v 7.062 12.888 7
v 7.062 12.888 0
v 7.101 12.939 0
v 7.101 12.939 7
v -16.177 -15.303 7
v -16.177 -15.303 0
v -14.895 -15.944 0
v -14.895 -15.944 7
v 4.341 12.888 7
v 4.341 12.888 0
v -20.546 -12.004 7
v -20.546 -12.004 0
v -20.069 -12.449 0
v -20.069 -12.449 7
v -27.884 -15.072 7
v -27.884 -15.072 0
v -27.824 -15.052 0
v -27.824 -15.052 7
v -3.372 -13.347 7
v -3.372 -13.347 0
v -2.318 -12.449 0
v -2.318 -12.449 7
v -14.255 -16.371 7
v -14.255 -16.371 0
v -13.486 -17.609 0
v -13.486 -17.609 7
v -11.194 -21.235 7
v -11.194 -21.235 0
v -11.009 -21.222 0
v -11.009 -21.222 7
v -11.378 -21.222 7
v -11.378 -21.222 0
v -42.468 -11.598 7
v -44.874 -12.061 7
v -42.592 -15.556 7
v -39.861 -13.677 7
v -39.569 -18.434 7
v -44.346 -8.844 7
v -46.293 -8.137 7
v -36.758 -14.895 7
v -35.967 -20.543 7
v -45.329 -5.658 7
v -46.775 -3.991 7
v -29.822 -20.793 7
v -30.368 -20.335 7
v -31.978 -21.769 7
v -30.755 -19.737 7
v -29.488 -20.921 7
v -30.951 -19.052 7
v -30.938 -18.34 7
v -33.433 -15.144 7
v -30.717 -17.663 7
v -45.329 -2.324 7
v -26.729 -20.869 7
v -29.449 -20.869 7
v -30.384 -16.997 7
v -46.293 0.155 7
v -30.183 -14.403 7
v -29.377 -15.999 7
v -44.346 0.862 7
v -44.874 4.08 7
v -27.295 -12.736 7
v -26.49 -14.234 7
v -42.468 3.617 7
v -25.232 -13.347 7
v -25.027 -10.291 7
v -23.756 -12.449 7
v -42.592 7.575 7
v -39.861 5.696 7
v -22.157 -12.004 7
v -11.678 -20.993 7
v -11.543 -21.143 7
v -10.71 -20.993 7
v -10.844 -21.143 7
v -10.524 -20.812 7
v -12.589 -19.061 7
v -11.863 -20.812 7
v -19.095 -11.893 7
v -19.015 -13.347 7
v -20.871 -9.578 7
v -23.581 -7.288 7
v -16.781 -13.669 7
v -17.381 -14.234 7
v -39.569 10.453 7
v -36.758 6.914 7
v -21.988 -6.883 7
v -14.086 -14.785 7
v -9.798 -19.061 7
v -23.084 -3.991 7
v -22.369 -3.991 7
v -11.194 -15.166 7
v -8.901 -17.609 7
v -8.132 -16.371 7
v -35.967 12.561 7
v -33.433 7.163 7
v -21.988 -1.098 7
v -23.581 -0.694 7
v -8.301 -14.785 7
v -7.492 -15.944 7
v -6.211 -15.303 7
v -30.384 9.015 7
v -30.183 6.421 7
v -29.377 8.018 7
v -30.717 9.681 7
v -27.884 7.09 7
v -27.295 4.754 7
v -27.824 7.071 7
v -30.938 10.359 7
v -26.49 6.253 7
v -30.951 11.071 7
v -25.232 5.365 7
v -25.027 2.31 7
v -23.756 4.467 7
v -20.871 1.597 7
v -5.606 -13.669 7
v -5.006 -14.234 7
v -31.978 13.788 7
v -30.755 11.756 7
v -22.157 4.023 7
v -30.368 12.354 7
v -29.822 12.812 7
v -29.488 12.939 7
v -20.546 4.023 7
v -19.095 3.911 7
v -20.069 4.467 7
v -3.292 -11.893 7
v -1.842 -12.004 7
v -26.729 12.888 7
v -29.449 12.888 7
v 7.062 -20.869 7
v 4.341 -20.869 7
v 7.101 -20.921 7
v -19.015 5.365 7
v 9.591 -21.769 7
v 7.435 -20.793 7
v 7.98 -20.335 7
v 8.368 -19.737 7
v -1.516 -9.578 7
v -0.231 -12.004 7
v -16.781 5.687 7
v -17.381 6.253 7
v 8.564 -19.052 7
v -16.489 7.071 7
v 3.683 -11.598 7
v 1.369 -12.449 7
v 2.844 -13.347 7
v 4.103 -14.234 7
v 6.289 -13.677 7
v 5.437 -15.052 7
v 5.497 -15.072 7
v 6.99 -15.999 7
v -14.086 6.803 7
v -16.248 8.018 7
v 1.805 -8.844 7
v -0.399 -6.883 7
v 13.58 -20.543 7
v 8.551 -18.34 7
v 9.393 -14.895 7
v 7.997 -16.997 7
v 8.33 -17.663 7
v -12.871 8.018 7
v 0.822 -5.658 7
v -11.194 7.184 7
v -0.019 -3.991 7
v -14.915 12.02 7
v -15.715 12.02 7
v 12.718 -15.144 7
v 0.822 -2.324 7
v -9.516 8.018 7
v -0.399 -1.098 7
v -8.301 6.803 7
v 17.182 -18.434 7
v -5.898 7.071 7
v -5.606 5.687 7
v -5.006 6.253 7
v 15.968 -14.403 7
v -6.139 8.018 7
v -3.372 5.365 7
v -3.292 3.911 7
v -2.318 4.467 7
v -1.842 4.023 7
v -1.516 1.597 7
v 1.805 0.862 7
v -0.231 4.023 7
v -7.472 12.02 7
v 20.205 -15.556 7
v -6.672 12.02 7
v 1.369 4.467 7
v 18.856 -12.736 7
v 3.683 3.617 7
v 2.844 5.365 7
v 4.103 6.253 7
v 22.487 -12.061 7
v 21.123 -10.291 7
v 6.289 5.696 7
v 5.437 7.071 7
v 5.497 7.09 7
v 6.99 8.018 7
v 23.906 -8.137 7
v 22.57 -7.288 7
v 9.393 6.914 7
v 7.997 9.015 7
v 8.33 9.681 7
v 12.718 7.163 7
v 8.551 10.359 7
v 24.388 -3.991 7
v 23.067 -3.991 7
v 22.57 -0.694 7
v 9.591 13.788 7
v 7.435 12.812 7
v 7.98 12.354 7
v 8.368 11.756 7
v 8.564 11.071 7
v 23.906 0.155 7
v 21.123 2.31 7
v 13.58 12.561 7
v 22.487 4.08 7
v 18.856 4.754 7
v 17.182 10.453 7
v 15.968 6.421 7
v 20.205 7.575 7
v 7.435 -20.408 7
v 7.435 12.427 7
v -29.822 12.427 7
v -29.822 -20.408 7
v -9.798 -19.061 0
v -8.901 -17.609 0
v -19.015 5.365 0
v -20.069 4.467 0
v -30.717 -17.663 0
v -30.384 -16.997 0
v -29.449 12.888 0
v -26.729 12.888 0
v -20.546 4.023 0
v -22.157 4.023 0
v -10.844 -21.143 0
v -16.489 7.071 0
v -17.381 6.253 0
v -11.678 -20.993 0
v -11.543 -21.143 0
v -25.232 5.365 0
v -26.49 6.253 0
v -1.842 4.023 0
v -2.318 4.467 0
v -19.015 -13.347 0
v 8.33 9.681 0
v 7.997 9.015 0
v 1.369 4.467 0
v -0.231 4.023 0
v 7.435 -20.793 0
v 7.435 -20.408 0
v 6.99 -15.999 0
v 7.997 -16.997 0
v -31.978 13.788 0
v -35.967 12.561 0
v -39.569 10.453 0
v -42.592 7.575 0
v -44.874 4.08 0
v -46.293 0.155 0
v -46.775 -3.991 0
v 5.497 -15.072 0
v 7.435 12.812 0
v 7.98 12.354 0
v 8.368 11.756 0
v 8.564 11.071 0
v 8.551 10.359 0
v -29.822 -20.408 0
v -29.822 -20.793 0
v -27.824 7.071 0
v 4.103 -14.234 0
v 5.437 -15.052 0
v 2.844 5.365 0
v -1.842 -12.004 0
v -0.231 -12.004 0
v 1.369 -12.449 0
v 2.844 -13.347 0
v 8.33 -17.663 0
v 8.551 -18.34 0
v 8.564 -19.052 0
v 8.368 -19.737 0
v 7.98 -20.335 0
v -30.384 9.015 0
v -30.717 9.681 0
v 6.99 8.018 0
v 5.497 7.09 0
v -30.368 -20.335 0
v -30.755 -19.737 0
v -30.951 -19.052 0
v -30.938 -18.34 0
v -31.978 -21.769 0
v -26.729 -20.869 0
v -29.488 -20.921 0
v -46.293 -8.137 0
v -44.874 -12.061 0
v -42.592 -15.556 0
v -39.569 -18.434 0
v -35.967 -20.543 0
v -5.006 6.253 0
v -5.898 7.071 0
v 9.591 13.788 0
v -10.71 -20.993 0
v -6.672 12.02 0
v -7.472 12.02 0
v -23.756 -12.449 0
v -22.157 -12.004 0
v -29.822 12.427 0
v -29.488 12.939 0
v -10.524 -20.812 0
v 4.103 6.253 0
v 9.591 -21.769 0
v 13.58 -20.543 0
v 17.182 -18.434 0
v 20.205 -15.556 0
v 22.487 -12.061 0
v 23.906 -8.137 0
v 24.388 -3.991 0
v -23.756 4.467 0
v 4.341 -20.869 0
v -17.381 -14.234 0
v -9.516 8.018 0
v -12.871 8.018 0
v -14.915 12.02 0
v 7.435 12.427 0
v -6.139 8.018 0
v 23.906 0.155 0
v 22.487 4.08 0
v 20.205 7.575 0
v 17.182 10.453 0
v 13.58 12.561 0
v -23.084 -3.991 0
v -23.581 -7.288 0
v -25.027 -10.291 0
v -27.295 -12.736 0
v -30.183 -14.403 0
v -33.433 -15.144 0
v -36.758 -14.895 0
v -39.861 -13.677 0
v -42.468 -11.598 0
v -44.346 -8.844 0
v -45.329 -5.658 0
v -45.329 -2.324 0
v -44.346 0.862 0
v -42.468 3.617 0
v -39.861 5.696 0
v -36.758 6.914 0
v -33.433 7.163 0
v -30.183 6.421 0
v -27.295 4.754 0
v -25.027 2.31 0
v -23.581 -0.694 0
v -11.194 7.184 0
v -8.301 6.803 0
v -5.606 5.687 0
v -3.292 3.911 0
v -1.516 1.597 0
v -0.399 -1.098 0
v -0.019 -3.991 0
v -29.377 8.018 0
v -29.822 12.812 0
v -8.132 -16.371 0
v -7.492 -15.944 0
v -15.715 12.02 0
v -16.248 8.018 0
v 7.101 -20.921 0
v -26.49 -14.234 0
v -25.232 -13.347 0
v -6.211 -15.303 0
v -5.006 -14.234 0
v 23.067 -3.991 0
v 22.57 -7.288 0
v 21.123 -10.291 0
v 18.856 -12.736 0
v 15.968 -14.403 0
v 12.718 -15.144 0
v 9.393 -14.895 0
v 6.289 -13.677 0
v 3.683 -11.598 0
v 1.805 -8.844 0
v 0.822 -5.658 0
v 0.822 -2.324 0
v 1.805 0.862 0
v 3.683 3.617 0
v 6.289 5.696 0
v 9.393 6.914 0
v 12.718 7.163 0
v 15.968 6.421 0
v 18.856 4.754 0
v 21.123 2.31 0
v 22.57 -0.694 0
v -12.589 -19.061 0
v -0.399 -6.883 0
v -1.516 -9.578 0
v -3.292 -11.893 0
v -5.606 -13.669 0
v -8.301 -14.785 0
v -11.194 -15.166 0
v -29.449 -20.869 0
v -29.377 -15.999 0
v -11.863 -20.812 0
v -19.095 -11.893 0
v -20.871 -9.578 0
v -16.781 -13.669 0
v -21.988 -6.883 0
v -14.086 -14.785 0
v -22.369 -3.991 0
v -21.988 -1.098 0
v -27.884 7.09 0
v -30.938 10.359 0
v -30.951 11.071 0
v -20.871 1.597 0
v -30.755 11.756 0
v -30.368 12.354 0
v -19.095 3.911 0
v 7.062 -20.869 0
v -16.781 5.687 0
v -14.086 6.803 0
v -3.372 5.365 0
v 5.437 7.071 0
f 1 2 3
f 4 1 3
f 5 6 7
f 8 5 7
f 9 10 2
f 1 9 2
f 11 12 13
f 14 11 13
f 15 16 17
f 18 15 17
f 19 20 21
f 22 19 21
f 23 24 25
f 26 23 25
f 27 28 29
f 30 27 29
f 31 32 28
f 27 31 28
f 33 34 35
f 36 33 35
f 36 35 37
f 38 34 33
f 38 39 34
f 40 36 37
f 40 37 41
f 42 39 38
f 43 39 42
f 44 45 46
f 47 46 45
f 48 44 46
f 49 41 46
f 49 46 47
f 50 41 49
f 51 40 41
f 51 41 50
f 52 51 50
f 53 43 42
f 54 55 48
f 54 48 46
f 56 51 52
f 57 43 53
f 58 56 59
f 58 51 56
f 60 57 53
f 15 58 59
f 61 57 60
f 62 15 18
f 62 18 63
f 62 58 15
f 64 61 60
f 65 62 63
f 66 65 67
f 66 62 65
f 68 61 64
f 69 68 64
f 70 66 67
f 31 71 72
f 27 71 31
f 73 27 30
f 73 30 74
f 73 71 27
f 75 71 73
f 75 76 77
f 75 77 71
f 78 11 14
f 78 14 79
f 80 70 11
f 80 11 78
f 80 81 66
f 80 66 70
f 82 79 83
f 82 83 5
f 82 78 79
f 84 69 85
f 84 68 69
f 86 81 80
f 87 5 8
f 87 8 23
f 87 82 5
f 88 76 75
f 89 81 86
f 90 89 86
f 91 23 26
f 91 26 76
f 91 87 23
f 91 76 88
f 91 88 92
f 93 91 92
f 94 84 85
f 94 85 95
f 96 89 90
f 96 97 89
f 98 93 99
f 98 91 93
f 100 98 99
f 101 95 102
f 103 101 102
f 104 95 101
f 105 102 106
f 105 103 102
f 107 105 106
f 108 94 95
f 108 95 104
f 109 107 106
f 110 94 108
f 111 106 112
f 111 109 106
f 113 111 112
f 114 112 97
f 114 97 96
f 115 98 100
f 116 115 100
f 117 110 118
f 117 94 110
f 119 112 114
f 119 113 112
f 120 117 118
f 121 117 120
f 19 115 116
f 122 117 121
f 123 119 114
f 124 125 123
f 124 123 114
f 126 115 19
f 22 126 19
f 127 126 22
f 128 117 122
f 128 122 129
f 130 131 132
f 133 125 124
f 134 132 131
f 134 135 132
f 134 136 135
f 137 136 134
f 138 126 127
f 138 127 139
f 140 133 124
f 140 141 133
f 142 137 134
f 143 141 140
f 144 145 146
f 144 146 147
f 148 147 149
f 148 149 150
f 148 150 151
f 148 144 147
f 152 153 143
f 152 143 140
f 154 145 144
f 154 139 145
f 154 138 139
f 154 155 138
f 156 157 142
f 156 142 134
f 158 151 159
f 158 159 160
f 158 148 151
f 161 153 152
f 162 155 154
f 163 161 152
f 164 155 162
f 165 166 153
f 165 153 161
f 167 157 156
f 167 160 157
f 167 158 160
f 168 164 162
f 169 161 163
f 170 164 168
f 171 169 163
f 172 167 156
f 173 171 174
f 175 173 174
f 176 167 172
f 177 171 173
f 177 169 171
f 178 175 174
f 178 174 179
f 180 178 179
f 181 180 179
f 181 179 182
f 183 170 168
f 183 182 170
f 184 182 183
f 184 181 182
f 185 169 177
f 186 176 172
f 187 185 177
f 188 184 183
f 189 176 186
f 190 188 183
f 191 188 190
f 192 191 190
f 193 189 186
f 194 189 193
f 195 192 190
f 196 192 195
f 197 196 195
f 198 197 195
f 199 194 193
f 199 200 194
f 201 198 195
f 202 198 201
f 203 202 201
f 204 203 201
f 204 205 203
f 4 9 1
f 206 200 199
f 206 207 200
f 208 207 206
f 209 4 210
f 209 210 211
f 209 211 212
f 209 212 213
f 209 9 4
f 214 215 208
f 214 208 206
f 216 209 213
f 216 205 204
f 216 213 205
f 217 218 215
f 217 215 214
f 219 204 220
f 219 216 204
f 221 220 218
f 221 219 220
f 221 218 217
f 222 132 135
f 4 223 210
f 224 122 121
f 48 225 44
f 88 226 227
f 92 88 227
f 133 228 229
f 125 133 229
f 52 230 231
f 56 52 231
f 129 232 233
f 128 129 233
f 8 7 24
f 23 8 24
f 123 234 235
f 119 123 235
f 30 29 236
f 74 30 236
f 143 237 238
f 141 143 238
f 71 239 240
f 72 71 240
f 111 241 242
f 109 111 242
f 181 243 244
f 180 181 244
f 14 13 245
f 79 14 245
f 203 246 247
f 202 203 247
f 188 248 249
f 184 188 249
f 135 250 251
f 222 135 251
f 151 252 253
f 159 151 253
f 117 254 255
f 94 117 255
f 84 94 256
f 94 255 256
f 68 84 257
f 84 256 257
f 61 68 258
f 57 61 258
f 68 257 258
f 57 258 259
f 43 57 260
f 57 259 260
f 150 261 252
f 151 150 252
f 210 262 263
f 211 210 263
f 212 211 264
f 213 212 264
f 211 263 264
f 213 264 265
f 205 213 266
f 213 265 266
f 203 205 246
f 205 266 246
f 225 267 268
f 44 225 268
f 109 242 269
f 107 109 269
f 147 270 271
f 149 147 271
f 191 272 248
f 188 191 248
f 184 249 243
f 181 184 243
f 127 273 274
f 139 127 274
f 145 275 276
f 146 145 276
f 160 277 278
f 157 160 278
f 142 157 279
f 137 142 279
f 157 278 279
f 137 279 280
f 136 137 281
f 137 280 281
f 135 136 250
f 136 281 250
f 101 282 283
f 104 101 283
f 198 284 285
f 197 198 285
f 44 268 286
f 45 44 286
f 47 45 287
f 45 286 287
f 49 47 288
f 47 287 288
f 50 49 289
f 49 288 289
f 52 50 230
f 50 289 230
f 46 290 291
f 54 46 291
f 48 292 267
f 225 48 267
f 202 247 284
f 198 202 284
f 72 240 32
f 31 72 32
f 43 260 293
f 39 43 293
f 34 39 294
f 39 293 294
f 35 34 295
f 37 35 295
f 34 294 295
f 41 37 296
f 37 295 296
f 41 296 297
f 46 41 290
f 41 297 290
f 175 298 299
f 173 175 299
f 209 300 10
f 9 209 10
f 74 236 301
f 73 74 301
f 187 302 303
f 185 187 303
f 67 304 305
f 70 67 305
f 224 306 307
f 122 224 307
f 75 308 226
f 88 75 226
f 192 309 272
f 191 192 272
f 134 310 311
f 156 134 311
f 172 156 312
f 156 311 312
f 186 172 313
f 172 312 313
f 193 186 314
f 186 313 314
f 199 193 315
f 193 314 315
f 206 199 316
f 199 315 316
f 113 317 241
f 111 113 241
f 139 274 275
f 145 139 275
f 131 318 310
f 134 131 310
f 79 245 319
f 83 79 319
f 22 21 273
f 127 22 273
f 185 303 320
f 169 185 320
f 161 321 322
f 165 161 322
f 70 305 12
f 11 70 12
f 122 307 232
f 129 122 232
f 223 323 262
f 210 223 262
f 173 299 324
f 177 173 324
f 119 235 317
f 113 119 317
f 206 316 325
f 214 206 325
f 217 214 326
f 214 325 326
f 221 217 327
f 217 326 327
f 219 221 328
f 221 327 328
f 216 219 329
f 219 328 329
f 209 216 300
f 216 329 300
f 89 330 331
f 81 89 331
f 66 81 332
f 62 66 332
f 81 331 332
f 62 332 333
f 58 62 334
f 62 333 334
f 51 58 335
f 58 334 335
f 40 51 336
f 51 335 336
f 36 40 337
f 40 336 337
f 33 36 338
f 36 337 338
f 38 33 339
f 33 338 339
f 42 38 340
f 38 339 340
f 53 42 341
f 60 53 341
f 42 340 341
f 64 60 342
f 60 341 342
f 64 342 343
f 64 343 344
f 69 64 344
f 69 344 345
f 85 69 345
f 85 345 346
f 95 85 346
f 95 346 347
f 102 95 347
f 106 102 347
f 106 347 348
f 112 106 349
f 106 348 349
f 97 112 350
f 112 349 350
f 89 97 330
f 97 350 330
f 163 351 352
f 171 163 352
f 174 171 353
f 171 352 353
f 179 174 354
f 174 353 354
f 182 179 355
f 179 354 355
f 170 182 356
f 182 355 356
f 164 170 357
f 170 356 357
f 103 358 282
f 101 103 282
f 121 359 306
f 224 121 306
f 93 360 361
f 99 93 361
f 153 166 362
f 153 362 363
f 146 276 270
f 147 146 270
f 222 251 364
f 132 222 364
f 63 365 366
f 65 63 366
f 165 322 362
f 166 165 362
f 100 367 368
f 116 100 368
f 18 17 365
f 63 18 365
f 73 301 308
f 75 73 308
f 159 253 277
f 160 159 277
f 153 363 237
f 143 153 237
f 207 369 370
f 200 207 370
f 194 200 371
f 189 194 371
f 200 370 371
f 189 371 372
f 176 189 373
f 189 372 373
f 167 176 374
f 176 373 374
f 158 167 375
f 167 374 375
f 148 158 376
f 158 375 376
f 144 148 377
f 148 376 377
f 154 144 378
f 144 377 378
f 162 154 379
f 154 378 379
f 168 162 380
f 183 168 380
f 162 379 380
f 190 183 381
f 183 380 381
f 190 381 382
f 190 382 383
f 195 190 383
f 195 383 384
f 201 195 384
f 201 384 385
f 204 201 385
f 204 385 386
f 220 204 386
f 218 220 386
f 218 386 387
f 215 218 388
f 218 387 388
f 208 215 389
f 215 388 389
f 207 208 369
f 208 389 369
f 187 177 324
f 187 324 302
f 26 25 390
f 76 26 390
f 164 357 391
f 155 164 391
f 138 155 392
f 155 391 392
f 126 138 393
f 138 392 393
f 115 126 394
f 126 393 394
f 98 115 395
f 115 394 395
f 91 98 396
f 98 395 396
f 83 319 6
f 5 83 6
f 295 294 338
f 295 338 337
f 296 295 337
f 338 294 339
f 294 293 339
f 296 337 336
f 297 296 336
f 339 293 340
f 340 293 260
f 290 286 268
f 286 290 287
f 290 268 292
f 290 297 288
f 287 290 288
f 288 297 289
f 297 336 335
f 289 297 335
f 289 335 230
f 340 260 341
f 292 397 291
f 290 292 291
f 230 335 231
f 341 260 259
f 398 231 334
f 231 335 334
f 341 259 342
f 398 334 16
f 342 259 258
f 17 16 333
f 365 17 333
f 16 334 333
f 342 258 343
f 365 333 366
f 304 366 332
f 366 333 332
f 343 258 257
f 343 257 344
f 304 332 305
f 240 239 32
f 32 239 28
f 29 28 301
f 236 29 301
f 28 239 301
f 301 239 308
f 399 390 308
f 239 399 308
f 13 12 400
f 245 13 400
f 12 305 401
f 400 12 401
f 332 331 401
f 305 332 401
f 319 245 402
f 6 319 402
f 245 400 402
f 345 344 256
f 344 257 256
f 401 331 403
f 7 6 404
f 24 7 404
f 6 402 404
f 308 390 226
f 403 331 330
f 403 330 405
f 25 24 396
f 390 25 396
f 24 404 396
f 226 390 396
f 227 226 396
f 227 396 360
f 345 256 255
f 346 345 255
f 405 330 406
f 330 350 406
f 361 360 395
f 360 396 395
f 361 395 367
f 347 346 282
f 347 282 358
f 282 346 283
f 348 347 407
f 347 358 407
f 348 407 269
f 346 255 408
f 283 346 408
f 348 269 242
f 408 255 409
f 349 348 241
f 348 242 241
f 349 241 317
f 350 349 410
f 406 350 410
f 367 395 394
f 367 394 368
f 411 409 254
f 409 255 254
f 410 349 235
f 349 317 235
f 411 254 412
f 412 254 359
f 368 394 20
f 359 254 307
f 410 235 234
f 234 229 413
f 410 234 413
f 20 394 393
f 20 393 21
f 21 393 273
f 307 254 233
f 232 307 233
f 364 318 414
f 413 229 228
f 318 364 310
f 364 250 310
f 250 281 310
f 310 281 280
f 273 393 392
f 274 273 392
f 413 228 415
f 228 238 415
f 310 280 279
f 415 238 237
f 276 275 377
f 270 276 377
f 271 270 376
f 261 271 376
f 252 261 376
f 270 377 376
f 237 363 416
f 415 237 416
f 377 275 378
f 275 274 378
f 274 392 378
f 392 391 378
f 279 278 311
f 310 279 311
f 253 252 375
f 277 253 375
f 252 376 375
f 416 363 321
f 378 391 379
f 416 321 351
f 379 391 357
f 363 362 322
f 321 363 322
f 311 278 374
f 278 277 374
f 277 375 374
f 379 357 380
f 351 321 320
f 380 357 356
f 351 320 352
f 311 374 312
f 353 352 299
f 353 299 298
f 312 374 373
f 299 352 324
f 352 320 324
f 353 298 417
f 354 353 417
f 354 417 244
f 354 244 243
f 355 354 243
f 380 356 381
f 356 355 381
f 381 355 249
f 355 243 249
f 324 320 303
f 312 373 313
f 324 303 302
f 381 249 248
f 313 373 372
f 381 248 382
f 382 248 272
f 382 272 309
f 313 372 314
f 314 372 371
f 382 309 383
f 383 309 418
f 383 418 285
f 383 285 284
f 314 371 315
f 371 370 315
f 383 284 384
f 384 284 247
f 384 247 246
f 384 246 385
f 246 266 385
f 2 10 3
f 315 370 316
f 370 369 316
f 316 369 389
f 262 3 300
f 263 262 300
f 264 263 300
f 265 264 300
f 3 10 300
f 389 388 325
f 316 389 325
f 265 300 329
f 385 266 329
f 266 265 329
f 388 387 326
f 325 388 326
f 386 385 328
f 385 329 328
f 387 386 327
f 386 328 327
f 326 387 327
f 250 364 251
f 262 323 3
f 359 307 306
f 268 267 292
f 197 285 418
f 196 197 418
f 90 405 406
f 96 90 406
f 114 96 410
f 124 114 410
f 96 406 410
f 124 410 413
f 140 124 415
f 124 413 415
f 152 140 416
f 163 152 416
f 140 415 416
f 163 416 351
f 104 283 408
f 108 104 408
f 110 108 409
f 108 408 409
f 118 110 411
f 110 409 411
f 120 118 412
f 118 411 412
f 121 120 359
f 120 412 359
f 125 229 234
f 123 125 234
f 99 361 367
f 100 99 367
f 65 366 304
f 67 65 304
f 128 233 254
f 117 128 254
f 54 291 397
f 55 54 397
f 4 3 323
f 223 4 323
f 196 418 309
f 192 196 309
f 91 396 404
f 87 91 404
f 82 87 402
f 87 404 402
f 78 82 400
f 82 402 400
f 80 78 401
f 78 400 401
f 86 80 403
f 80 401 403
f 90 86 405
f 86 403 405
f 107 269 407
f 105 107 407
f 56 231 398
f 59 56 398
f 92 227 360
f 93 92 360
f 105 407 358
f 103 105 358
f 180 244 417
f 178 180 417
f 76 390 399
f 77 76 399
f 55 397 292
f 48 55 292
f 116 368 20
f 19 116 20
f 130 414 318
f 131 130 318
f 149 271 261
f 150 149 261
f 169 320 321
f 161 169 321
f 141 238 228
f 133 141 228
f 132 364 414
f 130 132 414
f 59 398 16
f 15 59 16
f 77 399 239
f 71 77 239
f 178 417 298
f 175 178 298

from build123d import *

# Parameters (mm, degrees)
F1_DEPTH = 7


with BuildPart() as f1:
    # F0 (on Top) → F1 (new body)
    with BuildSketch(Plane.XY):
        with BuildLine():
            Line((-9.5156790438, 8.0177858472), (-11.1935704821, 8.0177858472))
            Line((-11.1935704821, 8.0177858472), (-11.1935704821, 7.1842455149))
            ThreePointArc((-11.1935704821, 7.1842455149), (-3.2916522024, 3.9111637946), (-0.0185704821, -3.9907544851))
            Line((-0.0185704821, -3.9907544851), (0.6968380189, -3.9907544851))
            ThreePointArc((0.6968380189, -3.9907544851), (11.8818380189, 7.1942455149), (23.0668380189, -3.9907544851))
            Line((23.0668380189, -3.9907544851), (24.3879653764, -3.9907544851))
            ThreePointArc((24.3879653764, -3.9907544851), (20.2046001278, 7.574637803), (9.5905543801, 13.7875981641))
            Line((9.5905543801, 13.7875981641), (4.3414574909, 12.8877644123))
            Line((4.3414574909, 12.8877644123), (7.0621605543, 12.8877644123))
            Line((7.0621605543, 12.8877644123), (7.1005078763, 12.9391789266))
            Line((7.1005078763, 12.9391789266), (7.0621605543, 12.9979698101))
            ThreePointArc((7.0621605543, 12.9979698101), (7.0936847528, 12.9852326851), (7.1250260168, 12.9720518424))
            Line((7.1250260168, 12.9720518424), (7.434807209, 13.3873937414))
            Line((7.434807209, 13.3873937414), (7.434807209, 12.8117063385))
            ThreePointArc((7.434807209, 12.8117063385), (8.491424386, 11.4206477043), (8.3299577236, 9.68127641))
            Line((8.3299577236, 9.68127641), (7.9968838744, 9.0151312817))
            Line((7.9968838744, 9.0151312817), (6.9897325292, 8.0177858472))
            Line((6.9897325292, 8.0177858472), (5.4971418776, 7.0902415154))
            Line((5.4971418776, 7.0902415154), (5.4365344596, 7.0707021364))
            Line((5.4365344596, 7.0707021364), (4.1030183685, 6.2526246615))
            Line((4.1030183685, 6.2526246615), (2.8443824751, 5.3654393264))
            Line((2.8443824751, 5.3654393264), (1.3687987131, 4.4671497308))
            Line((1.3687987131, 4.4671497308), (-0.2305540937, 4.0228855796))
            Line((-0.2305540937, 4.0228855796), (-1.8416251987, 4.0228855796))
            Line((-1.8416251987, 4.0228855796), (-2.3177509651, 4.4671497308))
            Line((-2.3177509651, 4.4671497308), (-3.372264767, 5.3654393264))
            Line((-3.372264767, 5.3654393264), (-5.0061216356, 6.2526246615))
            Line((-5.0061216356, 6.2526246615), (-5.8977964759, 7.0707021364))
            Line((-5.8977964759, 7.0707021364), (-6.1392687011, 8.0177858472))
            Line((-6.1392687011, 8.0177858472), (-6.6723875451, 12.0196435601))
            Line((-6.6723875451, 12.0196435601), (-7.4720630172, 12.0196435601))
            Line((-7.4720630172, 12.0196435601), (-9.5156790438, 8.0177858472))
        make_face()
        with BuildLine():
            Line((-11.1935704821, 7.1842455149), (-11.1935704821, 8.0177858472))
            Line((-11.1935704821, 8.0177858472), (-12.8714619204, 8.0177858472))
            Line((-12.8714619204, 8.0177858472), (-14.9150779471, 12.0196435601))
            Line((-14.9150779471, 12.0196435601), (-15.7147534192, 12.0196435601))
            Line((-15.7147534192, 12.0196435601), (-16.2478722632, 8.0177858472))
            Line((-16.2478722632, 8.0177858472), (-16.4893444883, 7.0707021364))
            Line((-16.4893444883, 7.0707021364), (-17.3810193286, 6.2526246615))
            Line((-17.3810193286, 6.2526246615), (-19.0148761972, 5.3654393264))
            Line((-19.0148761972, 5.3654393264), (-20.0693899991, 4.4671497308))
            Line((-20.0693899991, 4.4671497308), (-20.5455157655, 4.0228855796))
            Line((-20.5455157655, 4.0228855796), (-22.1565868706, 4.0228855796))
            Line((-22.1565868706, 4.0228855796), (-23.7559396774, 4.4671497308))
            Line((-23.7559396774, 4.4671497308), (-25.2315234393, 5.3654393264))
            Line((-25.2315234393, 5.3654393264), (-26.4901593328, 6.2526246615))
            Line((-26.4901593328, 6.2526246615), (-27.8236754239, 7.0707021364))
            Line((-27.8236754239, 7.0707021364), (-27.8842828419, 7.0902415154))
            Line((-27.8842828419, 7.0902415154), (-29.3768734935, 8.0177858472))
            Line((-29.3768734935, 8.0177858472), (-30.3840248386, 9.0151312817))
            Line((-30.3840248386, 9.0151312817), (-30.7170986879, 9.68127641))
            ThreePointArc((-30.7170986879, 9.68127641), (-30.8785653503, 11.4206477043), (-29.8219481732, 12.8117063385))
            Line((-29.8219481732, 12.8117063385), (-29.8219481732, 13.3873937414))
            Line((-29.8219481732, 13.3873937414), (-29.5121669811, 12.9720518424))
            ThreePointArc((-29.5121669811, 12.9720518424), (-29.4808257171, 12.9852326851), (-29.4493015186, 12.9979698101))
            Line((-29.4493015186, 12.9979698101), (-29.4876488406, 12.9391789266))
            Line((-29.4876488406, 12.9391789266), (-29.4493015186, 12.8877644123))
            Line((-29.4493015186, 12.8877644123), (-26.7285984551, 12.8877644123))
            Line((-26.7285984551, 12.8877644123), (-31.9776953444, 13.7875981641))
            ThreePointArc((-31.9776953444, 13.7875981641), (-42.591741092, 7.574637803), (-46.7751063406, -3.9907544851))
            Line((-46.7751063406, -3.9907544851), (-45.4539789832, -3.9907544851))
            ThreePointArc((-45.4539789832, -3.9907544851), (-34.2689789832, 7.1942455149), (-23.0839789832, -3.9907544851))
            Line((-23.0839789832, -3.9907544851), (-22.3685704821, -3.9907544851))
            ThreePointArc((-22.3685704821, -3.9907544851), (-19.0954887619, 3.9111637946), (-11.1935704821, 7.1842455149))
        make_face()
        with BuildLine():
            Line((0.6968380189, -3.9907544851), (-0.0185704821, -3.9907544851))
            ThreePointArc((-0.0185704821, -3.9907544851), (-3.2916522024, -11.8926727649), (-11.1935704821, -15.1657544851))
            Line((-11.1935704821, -15.1657544851), (-11.1935704821, -20.9864545614))
            Line((-11.1935704821, -20.9864545614), (-11.1935704821, -21.2352294797))
            Line((-11.1935704821, -21.2352294797), (-11.0093258071, -21.2222263217))
            Line((-11.0093258071, -21.2222263217), (-10.8436854306, -21.1433488876))
            Line((-10.8436854306, -21.1433488876), (-10.7095954689, -20.9934841841))
            Line((-10.7095954689, -20.9934841841), (-10.5240434158, -20.8122693002))
            Line((-10.5240434158, -20.8122693002), (-9.7980234521, -19.0612804145))
            Line((-9.7980234521, -19.0612804145), (-8.9011756453, -17.6092404872))
            Line((-8.9011756453, -17.6092404872), (-8.1324489537, -16.3707379252))
            Line((-8.1324489537, -16.3707379252), (-7.4918433773, -15.9436669201))
            Line((-7.4918433773, -15.9436669201), (-6.2106322247, -15.3030613437))
            Line((-6.2106322247, -15.3030613437), (-5.0061216356, -14.2341336318))
            Line((-5.0061216356, -14.2341336318), (-3.372264767, -13.3469482966))
            Line((-3.372264767, -13.3469482966), (-2.3177509651, -12.448658701))
            Line((-2.3177509651, -12.448658701), (-1.8416251987, -12.0043945499))
            Line((-1.8416251987, -12.0043945499), (-0.2305540937, -12.0043945499))
            Line((-0.2305540937, -12.0043945499), (1.3687987131, -12.448658701))
            Line((1.3687987131, -12.448658701), (2.8443824751, -13.3469482966))
            Line((2.8443824751, -13.3469482966), (4.1030183685, -14.2341336318))
            Line((4.1030183685, -14.2341336318), (5.4365344596, -15.0522111066))
            Line((5.4365344596, -15.0522111066), (5.4971418776, -15.0717504856))
            Line((5.4971418776, -15.0717504856), (6.9897325292, -15.9992948174))
            Line((6.9897325292, -15.9992948174), (7.9968838744, -16.996640252))
            Line((7.9968838744, -16.996640252), (8.3299577236, -17.6627853803))
            ThreePointArc((8.3299577236, -17.6627853803), (8.491424386, -19.4021566746), (7.434807209, -20.7932153088))
            Line((7.434807209, -20.7932153088), (7.434807209, -21.3689027117))
            Line((7.434807209, -21.3689027117), (7.1250260168, -20.9535608126))
            ThreePointArc((7.1250260168, -20.9535608126), (7.0936847528, -20.9667416554), (7.0621605543, -20.9794787804))
            Line((7.0621605543, -20.9794787804), (7.1005078763, -20.9206878969))
            Line((7.1005078763, -20.9206878969), (7.0621605543, -20.8692733825))
            Line((7.0621605543, -20.8692733825), (4.3414574909, -20.8692733825))
            Line((4.3414574909, -20.8692733825), (9.5905543801, -21.7691071344))
            ThreePointArc((9.5905543801, -21.7691071344), (20.2046001278, -15.5561467733), (24.3879653764, -3.9907544851))
            Line((24.3879653764, -3.9907544851), (23.0668380189, -3.9907544851))
            ThreePointArc((23.0668380189, -3.9907544851), (11.8818380189, -15.1757544851), (0.6968380189, -3.9907544851))
        make_face()
        with BuildLine():
            ThreePointArc((-11.1935704821, -15.1657544851), (-19.0954887619, -11.8926727649), (-22.3685704821, -3.9907544851))
            Line((-22.3685704821, -3.9907544851), (-23.0839789832, -3.9907544851))
            ThreePointArc((-23.0839789832, -3.9907544851), (-34.2689789832, -15.1757544851), (-45.4539789832, -3.9907544851))
            Line((-45.4539789832, -3.9907544851), (-46.7751063406, -3.9907544851))
            ThreePointArc((-46.7751063406, -3.9907544851), (-42.591741092, -15.5561467733), (-31.9776953444, -21.7691071344))
            Line((-31.9776953444, -21.7691071344), (-26.7285984551, -20.8692733825))
            Line((-26.7285984551, -20.8692733825), (-29.4493015186, -20.8692733825))
            Line((-29.4493015186, -20.8692733825), (-29.4876488406, -20.9206878969))
            Line((-29.4876488406, -20.9206878969), (-29.4493015186, -20.9794787804))
            ThreePointArc((-29.4493015186, -20.9794787804), (-29.4808257171, -20.9667416554), (-29.5121669811, -20.9535608126))
            Line((-29.5121669811, -20.9535608126), (-29.8219481732, -21.3689027117))
            Line((-29.8219481732, -21.3689027117), (-29.8219481732, -20.7932153088))
            ThreePointArc((-29.8219481732, -20.7932153088), (-30.8785653503, -19.4021566746), (-30.7170986879, -17.6627853803))
            Line((-30.7170986879, -17.6627853803), (-30.3840248386, -16.996640252))
            Line((-30.3840248386, -16.996640252), (-29.3768734935, -15.9992948174))
            Line((-29.3768734935, -15.9992948174), (-27.8842828419, -15.0717504856))
            Line((-27.8842828419, -15.0717504856), (-27.8236754239, -15.0522111066))
            Line((-27.8236754239, -15.0522111066), (-26.4901593328, -14.2341336318))
            Line((-26.4901593328, -14.2341336318), (-25.2315234393, -13.3469482966))
            Line((-25.2315234393, -13.3469482966), (-23.7559396774, -12.448658701))
            Line((-23.7559396774, -12.448658701), (-22.1565868706, -12.0043945499))
            Line((-22.1565868706, -12.0043945499), (-20.5455157655, -12.0043945499))
            Line((-20.5455157655, -12.0043945499), (-20.0693899991, -12.448658701))
            Line((-20.0693899991, -12.448658701), (-19.0148761972, -13.3469482966))
            Line((-19.0148761972, -13.3469482966), (-17.3810193286, -14.2341336318))
            Line((-17.3810193286, -14.2341336318), (-16.1765087396, -15.3030613437))
            Line((-16.1765087396, -15.3030613437), (-14.8952975869, -15.9436669201))
            Line((-14.8952975869, -15.9436669201), (-14.2546920106, -16.3707379252))
            Line((-14.2546920106, -16.3707379252), (-13.485965319, -17.6092404872))
            Line((-13.485965319, -17.6092404872), (-12.5891175121, -19.0612804145))
            Line((-12.5891175121, -19.0612804145), (-11.8630975485, -20.8122693002))
            Line((-11.8630975485, -20.8122693002), (-11.6775454953, -20.9934841841))
            Line((-11.6775454953, -20.9934841841), (-11.5434555337, -21.1433488876))
            Line((-11.5434555337, -21.1433488876), (-11.3778151572, -21.2222263217))
            Line((-11.3778151572, -21.2222263217), (-11.1935704821, -21.2352294797))
            Line((-11.1935704821, -21.2352294797), (-11.1935704821, -20.9864545614))
            Line((-11.1935704821, -20.9864545614), (-11.1935704821, -15.1657544851))
        make_face()
        with BuildLine():
            Line((7.0621605543, 12.9979698101), (7.1005078763, 12.9391789266))
            Line((7.1005078763, 12.9391789266), (7.1250260168, 12.9720518424))
            ThreePointArc((7.1250260168, 12.9720518424), (7.0936847528, 12.9852326851), (7.0621605543, 12.9979698101))
        make_face()
        with BuildLine():
            Line((7.1250260168, 12.9720518424), (7.1005078763, 12.9391789266))
            Line((7.1005078763, 12.9391789266), (7.434807209, 12.4266593527))
            Line((7.434807209, 12.4266593527), (7.434807209, 12.8117063385))
            ThreePointArc((7.434807209, 12.8117063385), (7.2828231187, 12.897494345), (7.1250260168, 12.9720518424))
        make_face()
        with BuildLine():
            Line((7.434807209, -20.4081683229), (7.1005078763, -20.9206878969))
            Line((7.1005078763, -20.9206878969), (7.1250260168, -20.9535608126))
            ThreePointArc((7.1250260168, -20.9535608126), (7.2828231187, -20.8790033153), (7.434807209, -20.7932153088))
            Line((7.434807209, -20.7932153088), (7.434807209, -20.4081683229))
        make_face()
        with BuildLine():
            Line((7.1250260168, -20.9535608126), (7.1005078763, -20.9206878969))
            Line((7.1005078763, -20.9206878969), (7.0621605543, -20.9794787804))
            ThreePointArc((7.0621605543, -20.9794787804), (7.0936847528, -20.9667416554), (7.1250260168, -20.9535608126))
        make_face()
        with BuildLine():
            Line((-29.5121669811, 12.9720518424), (-29.4876488406, 12.9391789266))
            Line((-29.4876488406, 12.9391789266), (-29.4493015186, 12.9979698101))
            ThreePointArc((-29.4493015186, 12.9979698101), (-29.4808257171, 12.9852326851), (-29.5121669811, 12.9720518424))
        make_face()
        with BuildLine():
            Line((-29.8219481732, 12.4266593527), (-29.4876488406, 12.9391789266))
            Line((-29.4876488406, 12.9391789266), (-29.5121669811, 12.9720518424))
            ThreePointArc((-29.5121669811, 12.9720518424), (-29.6699640829, 12.897494345), (-29.8219481732, 12.8117063385))
            Line((-29.8219481732, 12.8117063385), (-29.8219481732, 12.4266593527))
        make_face()
        with BuildLine():
            Line((-29.4493015186, -20.9794787804), (-29.4876488406, -20.9206878969))
            Line((-29.4876488406, -20.9206878969), (-29.5121669811, -20.9535608126))
            ThreePointArc((-29.5121669811, -20.9535608126), (-29.4808257171, -20.9667416554), (-29.4493015186, -20.9794787804))
        make_face()
        with BuildLine():
            Line((-29.5121669811, -20.9535608126), (-29.4876488406, -20.9206878969))
            Line((-29.4876488406, -20.9206878969), (-29.8219481732, -20.4081683229))
            Line((-29.8219481732, -20.4081683229), (-29.8219481732, -20.7932153088))
            ThreePointArc((-29.8219481732, -20.7932153088), (-29.6699640829, -20.8790033153), (-29.5121669811, -20.9535608126))
        make_face()
        with BuildLine():
            Line((7.434807209, 13.3873937414), (7.1250260168, 12.9720518424))
            ThreePointArc((7.1250260168, 12.9720518424), (7.2828231187, 12.897494345), (7.434807209, 12.8117063385))
            Line((7.434807209, 12.8117063385), (7.434807209, 13.3873937414))
        make_face()
        with BuildLine():
            ThreePointArc((7.434807209, -20.7932153088), (7.2828231187, -20.8790033153), (7.1250260168, -20.9535608126))
            Line((7.1250260168, -20.9535608126), (7.434807209, -21.3689027117))
            Line((7.434807209, -21.3689027117), (7.434807209, -20.7932153088))
        make_face()
        with BuildLine():
            ThreePointArc((-29.8219481732, 12.8117063385), (-29.6699640829, 12.897494345), (-29.5121669811, 12.9720518424))
            Line((-29.5121669811, 12.9720518424), (-29.8219481732, 13.3873937414))
            Line((-29.8219481732, 13.3873937414), (-29.8219481732, 12.8117063385))
        make_face()
        with BuildLine():
            Line((-29.8219481732, -21.3689027117), (-29.5121669811, -20.9535608126))
            ThreePointArc((-29.5121669811, -20.9535608126), (-29.6699640829, -20.8790033153), (-29.8219481732, -20.7932153088))
            Line((-29.8219481732, -20.7932153088), (-29.8219481732, -21.3689027117))
        make_face()
    extrude(amount=F1_DEPTH)


solid = f1.part
